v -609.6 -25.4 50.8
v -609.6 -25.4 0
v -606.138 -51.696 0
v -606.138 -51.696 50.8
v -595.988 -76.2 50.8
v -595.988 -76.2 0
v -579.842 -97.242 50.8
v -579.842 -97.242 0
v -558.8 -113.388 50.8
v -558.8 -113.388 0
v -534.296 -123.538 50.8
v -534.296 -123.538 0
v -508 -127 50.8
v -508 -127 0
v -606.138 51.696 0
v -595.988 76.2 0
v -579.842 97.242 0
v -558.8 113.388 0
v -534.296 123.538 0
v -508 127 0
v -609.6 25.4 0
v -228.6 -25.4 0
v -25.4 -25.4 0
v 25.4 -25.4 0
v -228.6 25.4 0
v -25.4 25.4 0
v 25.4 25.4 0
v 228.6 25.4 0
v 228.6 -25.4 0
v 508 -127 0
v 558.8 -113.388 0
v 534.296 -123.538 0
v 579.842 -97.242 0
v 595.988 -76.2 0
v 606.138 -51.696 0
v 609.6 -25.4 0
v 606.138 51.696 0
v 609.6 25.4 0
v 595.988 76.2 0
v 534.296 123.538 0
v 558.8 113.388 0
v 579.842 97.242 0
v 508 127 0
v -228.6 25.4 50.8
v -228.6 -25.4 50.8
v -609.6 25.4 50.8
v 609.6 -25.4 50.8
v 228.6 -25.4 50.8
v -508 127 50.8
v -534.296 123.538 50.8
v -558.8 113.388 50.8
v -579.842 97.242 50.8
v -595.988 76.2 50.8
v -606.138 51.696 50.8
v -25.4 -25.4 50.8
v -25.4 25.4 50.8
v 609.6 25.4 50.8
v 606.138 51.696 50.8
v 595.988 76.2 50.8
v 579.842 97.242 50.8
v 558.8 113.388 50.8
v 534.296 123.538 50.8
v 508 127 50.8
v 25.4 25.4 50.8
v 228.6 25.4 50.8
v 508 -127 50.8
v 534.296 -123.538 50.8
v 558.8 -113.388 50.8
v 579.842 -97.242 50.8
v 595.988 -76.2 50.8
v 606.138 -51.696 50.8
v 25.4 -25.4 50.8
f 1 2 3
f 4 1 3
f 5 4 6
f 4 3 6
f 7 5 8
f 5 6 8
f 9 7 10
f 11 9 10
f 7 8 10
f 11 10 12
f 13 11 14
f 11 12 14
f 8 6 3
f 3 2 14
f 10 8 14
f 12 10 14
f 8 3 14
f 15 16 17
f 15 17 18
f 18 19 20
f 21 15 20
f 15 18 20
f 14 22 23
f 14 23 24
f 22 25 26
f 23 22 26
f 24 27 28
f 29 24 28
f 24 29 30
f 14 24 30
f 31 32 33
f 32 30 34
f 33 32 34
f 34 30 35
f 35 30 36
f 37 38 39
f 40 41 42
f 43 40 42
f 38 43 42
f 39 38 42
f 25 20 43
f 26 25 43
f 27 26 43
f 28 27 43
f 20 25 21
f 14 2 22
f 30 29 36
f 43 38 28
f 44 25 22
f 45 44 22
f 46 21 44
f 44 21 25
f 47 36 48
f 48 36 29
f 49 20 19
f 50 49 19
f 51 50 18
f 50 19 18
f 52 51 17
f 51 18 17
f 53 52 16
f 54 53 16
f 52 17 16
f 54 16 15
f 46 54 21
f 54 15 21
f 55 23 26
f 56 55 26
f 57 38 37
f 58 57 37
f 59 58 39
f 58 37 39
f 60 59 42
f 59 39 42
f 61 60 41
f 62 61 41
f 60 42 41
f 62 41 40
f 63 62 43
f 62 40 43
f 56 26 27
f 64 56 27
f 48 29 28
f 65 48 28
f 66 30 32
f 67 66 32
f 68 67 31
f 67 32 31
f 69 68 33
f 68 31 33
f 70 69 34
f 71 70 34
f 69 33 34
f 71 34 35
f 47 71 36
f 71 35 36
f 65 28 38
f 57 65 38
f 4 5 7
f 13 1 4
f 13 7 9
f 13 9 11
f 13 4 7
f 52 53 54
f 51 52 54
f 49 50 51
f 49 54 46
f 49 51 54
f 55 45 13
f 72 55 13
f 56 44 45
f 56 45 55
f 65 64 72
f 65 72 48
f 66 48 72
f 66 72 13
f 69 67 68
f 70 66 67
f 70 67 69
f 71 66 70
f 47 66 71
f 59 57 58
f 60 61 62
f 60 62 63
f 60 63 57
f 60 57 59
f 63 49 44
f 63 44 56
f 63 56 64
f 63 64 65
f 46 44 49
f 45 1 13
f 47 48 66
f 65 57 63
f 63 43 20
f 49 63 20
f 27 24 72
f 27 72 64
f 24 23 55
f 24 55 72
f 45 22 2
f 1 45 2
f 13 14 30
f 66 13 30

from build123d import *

# Parameters (mm, degrees)
F0_W     = 50.8
F0_H     = 50.8
F1_DEPTH = 50.8


with BuildPart() as f1:
    # F0 (on Top) → F1 (new body)
    with BuildSketch(Plane.XY):
        with BuildLine():
            ThreePointArc((609.6, 25.4), (579.842049, 97.242049), (508, 127))
            Line((508, 127), (-508, 127))
            ThreePointArc((-508, 127), (-579.842049, 97.242049), (-609.6, 25.4))
            Line((-609.6, 25.4), (-228.6, 25.4))
            Line((-228.6, 25.4), (-228.6, -25.4))
            Line((-228.6, -25.4), (-609.6, -25.4))
            ThreePointArc((-609.6, -25.4), (-579.842049, -97.242049), (-508, -127))
            Line((-508, -127), (508, -127))
            ThreePointArc((508, -127), (579.842049, -97.242049), (609.6, -25.4))
            Line((609.6, -25.4), (228.6, -25.4))
            Line((228.6, -25.4), (228.6, 25.4))
            Line((228.6, 25.4), (609.6, 25.4))
        make_face()
        Rectangle(F0_W, F0_H, mode=Mode.SUBTRACT)
    extrude(amount=F1_DEPTH)


solid = f1.part
